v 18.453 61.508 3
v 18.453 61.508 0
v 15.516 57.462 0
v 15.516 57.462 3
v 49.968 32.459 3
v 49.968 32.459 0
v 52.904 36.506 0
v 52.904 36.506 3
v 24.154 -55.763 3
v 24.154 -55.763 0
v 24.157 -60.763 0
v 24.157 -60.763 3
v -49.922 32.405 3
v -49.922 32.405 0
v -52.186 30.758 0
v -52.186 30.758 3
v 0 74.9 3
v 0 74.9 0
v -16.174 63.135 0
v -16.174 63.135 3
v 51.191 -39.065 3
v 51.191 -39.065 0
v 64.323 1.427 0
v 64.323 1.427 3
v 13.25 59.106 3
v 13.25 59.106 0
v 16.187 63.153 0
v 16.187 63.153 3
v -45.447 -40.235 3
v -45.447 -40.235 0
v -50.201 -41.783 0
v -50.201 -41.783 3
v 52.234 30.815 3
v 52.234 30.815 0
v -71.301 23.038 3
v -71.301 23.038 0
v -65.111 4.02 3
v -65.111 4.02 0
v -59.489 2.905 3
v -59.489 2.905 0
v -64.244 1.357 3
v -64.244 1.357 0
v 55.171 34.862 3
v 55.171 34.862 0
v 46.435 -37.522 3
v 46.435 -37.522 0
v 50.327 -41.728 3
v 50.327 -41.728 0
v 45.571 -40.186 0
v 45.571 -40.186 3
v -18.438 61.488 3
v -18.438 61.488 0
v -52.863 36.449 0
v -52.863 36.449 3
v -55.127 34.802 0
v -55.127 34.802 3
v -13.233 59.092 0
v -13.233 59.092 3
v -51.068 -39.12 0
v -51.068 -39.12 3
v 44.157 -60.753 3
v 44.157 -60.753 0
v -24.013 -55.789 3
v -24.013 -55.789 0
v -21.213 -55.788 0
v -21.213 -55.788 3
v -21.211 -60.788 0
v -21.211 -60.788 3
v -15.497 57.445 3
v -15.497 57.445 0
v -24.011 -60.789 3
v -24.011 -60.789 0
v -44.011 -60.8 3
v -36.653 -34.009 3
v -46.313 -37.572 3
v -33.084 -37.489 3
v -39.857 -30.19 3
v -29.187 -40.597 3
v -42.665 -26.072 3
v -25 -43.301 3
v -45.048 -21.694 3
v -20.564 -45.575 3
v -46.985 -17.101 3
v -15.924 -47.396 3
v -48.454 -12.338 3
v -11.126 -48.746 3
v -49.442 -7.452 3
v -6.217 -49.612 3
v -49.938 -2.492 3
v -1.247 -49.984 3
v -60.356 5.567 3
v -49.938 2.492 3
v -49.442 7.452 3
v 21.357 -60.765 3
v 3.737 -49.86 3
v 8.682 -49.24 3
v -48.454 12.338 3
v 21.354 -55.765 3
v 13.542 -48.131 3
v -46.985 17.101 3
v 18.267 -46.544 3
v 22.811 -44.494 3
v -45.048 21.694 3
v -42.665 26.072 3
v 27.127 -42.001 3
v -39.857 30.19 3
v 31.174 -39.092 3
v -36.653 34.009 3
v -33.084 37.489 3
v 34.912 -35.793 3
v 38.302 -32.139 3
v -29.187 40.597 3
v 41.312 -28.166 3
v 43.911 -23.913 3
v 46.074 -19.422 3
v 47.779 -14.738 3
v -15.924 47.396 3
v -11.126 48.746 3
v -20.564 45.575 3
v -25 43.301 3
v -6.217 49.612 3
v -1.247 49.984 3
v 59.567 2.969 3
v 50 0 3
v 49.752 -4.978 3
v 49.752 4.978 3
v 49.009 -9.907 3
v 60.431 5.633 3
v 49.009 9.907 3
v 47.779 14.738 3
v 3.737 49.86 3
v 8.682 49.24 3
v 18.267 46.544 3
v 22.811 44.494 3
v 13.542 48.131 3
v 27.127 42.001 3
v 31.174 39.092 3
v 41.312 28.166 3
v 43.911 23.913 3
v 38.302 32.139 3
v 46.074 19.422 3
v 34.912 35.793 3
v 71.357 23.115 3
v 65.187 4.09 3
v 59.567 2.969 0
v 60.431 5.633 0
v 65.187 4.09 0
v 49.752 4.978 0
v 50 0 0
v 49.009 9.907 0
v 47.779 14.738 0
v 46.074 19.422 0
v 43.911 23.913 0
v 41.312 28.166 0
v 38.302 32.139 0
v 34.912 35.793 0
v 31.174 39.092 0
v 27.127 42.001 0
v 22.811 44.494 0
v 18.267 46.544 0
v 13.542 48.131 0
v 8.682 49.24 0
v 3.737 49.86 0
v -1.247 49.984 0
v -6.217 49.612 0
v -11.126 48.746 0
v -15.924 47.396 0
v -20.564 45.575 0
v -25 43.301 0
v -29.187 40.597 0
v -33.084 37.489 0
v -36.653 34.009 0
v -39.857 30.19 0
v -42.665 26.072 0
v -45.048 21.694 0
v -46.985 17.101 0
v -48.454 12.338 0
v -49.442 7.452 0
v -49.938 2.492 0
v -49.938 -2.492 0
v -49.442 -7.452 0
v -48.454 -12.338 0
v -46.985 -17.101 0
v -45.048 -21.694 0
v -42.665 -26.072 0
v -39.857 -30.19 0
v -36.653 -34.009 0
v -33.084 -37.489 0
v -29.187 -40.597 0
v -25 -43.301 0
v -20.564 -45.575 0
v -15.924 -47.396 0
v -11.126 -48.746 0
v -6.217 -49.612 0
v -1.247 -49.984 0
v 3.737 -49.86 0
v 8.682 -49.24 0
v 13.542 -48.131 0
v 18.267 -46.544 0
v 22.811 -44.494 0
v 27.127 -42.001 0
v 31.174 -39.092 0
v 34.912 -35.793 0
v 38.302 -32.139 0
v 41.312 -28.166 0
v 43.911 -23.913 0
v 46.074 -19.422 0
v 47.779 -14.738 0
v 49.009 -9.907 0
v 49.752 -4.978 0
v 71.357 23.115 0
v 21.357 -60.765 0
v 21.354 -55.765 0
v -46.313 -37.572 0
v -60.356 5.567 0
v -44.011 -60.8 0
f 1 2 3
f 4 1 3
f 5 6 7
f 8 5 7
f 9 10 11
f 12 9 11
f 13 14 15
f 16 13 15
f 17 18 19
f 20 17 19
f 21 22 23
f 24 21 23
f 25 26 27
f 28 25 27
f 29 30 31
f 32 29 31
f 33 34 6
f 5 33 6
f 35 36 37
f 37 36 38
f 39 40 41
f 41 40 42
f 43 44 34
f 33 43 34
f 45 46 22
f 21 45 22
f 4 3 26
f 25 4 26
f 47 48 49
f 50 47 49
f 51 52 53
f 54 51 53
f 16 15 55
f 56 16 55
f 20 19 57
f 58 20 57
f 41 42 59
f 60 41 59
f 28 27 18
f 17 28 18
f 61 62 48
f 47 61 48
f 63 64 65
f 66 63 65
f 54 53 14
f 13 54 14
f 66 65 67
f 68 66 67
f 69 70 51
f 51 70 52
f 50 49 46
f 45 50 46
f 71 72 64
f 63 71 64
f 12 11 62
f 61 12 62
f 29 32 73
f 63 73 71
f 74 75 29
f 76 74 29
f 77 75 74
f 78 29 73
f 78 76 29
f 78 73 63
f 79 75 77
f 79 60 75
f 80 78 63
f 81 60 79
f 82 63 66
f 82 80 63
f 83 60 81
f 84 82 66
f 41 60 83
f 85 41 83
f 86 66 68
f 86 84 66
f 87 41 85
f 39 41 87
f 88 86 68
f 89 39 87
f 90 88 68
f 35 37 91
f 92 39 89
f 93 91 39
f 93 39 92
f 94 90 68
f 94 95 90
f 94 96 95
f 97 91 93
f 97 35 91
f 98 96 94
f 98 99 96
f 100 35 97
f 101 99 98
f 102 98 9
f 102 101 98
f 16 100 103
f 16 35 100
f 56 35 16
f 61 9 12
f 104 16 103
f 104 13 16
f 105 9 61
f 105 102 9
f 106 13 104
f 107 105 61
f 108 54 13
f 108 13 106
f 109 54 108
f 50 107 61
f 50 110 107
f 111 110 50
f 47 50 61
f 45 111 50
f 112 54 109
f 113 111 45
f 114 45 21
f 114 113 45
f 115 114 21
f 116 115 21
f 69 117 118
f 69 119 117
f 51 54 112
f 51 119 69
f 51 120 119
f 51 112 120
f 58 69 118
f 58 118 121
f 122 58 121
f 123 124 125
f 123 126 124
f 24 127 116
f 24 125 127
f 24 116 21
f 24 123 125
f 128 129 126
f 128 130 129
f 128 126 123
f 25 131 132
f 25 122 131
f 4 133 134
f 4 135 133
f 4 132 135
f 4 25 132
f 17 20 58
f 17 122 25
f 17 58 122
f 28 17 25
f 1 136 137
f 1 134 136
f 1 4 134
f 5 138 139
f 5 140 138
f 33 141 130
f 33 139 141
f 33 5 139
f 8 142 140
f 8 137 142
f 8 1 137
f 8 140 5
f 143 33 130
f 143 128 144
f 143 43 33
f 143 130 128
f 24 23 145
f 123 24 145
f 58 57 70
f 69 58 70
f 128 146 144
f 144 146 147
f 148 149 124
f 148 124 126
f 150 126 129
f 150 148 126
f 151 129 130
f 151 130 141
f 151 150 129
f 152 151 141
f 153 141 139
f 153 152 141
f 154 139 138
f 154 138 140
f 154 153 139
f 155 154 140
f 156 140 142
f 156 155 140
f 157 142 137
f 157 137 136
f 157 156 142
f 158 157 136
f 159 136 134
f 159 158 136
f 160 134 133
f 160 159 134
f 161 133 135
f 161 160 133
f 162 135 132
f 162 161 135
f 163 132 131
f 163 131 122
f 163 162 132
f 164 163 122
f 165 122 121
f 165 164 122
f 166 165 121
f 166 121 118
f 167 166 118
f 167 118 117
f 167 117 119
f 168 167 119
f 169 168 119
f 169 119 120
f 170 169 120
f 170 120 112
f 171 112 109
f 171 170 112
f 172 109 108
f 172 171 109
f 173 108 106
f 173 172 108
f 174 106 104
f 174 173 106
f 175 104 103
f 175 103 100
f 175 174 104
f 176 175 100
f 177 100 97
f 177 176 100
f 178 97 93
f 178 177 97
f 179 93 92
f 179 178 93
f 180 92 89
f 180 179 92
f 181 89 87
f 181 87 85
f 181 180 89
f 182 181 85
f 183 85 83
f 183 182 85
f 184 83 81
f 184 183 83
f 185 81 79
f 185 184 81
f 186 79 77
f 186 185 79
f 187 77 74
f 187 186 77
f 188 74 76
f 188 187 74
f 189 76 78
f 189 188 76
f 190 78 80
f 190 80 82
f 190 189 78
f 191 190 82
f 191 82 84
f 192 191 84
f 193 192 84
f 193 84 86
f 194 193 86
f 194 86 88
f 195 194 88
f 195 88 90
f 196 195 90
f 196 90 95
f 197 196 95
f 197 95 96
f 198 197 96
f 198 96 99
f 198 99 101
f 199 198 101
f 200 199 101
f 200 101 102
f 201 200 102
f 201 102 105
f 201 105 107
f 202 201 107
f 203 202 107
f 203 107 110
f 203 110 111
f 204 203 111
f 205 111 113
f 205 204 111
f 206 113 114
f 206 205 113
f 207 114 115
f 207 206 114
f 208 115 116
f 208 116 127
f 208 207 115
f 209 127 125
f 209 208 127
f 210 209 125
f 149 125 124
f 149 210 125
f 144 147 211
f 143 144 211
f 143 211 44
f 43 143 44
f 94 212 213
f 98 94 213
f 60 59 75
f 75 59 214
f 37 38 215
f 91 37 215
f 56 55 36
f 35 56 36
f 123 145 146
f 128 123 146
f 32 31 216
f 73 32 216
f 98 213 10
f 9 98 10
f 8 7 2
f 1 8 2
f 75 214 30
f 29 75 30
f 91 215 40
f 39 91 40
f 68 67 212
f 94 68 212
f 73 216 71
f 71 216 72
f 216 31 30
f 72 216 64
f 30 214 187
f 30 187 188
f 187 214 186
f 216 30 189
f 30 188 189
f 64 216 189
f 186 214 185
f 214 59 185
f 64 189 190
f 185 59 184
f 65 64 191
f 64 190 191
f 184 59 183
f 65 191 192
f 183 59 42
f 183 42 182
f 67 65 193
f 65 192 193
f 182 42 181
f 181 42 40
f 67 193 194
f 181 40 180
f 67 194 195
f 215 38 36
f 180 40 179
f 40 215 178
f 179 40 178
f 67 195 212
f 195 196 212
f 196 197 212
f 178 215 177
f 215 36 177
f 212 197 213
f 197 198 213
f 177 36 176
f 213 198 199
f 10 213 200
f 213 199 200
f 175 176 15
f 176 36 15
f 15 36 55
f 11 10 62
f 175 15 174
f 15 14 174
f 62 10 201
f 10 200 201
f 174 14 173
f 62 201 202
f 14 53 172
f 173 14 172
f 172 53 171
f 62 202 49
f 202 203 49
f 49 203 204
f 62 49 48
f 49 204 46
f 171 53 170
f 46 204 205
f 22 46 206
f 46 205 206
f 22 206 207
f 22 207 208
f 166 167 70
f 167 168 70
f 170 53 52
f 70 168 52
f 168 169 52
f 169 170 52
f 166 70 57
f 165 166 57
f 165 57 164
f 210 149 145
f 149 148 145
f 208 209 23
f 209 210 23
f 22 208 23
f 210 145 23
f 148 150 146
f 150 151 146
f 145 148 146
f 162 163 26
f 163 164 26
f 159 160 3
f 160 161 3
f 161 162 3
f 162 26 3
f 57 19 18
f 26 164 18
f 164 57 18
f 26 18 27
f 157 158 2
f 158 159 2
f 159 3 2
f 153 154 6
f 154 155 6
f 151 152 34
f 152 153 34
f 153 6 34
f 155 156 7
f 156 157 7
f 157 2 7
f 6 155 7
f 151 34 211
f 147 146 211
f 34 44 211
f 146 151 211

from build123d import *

# Parameters (mm, degrees)
F0_R     = 50
F1_DEPTH = 3


with BuildPart() as f1:
    # F0 (on Top) → F1 (new body)
    with BuildSketch(Plane.XY):
        Polygon((16.186687, 63.152809), (0, 74.899773), (-16.173988, 63.13533), (-13.232877, 59.091833), (-15.497236, 57.444811), (-18.438346, 61.488308), (-52.862891, 36.448993), (-49.92178, 32.405496), (-52.186139, 30.758474), (-55.127249, 34.801971), (-71.301237, 23.037529), (-65.110625, 4.019739), (-60.356177, 5.567392), (-59.489492, 2.904902), (-64.243939, 1.357249), (-51.067905, -39.120012), (-46.313457, -37.572359), (-45.446772, -40.23485), (-50.201219, -41.782503), (-44.010606, -60.800292), (-24.010609, -60.78949), (-24.01331, -55.789491), (-21.21331, -55.787978), (-21.21061, -60.787978), (21.357172, -60.764986), (21.354471, -55.764987), (24.154471, -55.763475), (24.157172, -60.763474), (44.157169, -60.752671), (50.327234, -41.728206), (45.571118, -40.185689), (46.434927, -37.522264), (51.191043, -39.064781), (64.323345, 1.42669), (59.567228, 2.969207), (60.431037, 5.632632), (65.187154, 4.090116), (71.357219, 23.114581), (55.170532, 34.861545), (52.233791, 30.814873), (49.967655, 32.459448), (52.904396, 36.50612), (18.452823, 61.508234), (15.516082, 57.461562), (13.249946, 59.106137), align=None)
        Circle(F0_R, mode=Mode.SUBTRACT)
    extrude(amount=F1_DEPTH)


solid = f1.part
